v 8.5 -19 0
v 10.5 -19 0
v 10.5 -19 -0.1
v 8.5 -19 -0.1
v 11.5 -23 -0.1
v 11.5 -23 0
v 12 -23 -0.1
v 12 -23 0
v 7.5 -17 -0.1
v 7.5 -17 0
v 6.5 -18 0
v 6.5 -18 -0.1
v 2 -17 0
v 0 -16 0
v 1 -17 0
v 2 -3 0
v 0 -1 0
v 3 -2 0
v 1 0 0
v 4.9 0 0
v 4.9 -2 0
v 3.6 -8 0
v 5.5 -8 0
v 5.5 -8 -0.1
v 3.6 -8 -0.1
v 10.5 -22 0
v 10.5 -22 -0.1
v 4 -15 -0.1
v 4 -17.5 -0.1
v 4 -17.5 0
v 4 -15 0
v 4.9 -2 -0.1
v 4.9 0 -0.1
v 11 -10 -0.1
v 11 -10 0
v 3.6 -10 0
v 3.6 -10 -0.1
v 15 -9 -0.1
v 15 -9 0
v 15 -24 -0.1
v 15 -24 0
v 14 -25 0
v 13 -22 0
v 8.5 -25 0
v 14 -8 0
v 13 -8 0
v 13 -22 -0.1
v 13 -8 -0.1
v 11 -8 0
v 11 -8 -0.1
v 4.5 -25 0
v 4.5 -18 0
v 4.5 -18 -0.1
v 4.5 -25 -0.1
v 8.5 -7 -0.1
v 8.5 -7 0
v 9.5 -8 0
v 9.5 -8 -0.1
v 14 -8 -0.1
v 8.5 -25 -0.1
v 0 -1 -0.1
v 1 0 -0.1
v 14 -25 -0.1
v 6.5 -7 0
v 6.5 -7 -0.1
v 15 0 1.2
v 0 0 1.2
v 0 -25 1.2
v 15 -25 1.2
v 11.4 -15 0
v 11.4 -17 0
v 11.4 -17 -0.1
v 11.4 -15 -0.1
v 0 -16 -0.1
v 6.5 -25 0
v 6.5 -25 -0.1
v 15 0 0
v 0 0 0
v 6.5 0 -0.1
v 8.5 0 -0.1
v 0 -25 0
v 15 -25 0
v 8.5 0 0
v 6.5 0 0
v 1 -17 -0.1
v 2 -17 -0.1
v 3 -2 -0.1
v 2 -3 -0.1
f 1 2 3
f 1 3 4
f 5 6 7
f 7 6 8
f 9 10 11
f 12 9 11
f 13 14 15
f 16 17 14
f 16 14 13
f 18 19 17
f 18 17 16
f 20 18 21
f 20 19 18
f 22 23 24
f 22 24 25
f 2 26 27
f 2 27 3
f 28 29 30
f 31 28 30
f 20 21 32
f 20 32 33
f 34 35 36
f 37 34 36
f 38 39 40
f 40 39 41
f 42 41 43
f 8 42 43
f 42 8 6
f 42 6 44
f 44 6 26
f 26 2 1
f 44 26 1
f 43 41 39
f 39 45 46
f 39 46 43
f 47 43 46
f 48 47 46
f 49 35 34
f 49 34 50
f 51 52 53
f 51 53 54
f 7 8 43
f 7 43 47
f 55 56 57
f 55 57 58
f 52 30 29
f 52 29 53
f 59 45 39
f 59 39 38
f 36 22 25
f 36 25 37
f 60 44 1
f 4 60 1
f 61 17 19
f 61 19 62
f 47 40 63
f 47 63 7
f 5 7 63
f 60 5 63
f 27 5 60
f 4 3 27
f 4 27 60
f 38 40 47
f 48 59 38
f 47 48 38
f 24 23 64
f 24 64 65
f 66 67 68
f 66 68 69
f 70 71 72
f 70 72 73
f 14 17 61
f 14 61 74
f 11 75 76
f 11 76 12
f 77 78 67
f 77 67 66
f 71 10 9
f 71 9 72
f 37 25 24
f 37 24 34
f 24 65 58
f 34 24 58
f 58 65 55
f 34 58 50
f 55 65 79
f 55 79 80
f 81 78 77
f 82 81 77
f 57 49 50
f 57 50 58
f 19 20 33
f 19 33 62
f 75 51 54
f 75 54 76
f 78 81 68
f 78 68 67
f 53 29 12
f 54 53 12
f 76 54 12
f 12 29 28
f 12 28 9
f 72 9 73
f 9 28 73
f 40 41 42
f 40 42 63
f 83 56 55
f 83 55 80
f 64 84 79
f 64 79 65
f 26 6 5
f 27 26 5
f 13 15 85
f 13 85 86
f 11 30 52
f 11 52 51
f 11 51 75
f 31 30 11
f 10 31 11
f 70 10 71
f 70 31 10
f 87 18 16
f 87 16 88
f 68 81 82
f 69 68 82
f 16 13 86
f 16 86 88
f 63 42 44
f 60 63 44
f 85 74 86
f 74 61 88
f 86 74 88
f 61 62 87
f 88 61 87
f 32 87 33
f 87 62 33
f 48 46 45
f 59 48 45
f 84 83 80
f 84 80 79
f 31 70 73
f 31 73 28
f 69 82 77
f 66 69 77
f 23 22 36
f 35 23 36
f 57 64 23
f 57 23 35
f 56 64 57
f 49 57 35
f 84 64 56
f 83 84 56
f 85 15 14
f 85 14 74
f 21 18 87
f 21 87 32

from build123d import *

# Parameters (mm, degrees)
SKETCH1_W             = 15
SKETCH1_H             = 25
BOSS_EXTRUDE1_DEPTH   = 1.2
BOSS_EXTRUDE2_DEPTH   = 0.1
BOSS_EXTRUDE2_2_DEPTH = 0.1
BOSS_EXTRUDE2_3_DEPTH = 0.1
BOSS_EXTRUDE2_4_DEPTH = 0.1
SKETCH3_W             = 2
SKETCH3_H             = 4
BOSS_EXTRUDE3_DEPTH   = 0.1
CHAMFER5_SIZE         = 1
CHAMFER6_SIZE         = 1
CHAMFER7_SIZE         = 1
CHAMFER8_SIZE         = 1


with BuildPart() as part:
    # Sketch1 → Boss-Extrude1 (new body)
    with BuildSketch(Plane.XY):
        with Locations((7.5, -12.5)):
            Rectangle(SKETCH1_W, SKETCH1_H)
    extrude(amount=BOSS_EXTRUDE1_DEPTH)


with BuildPart() as body_2:
    # Sketch2 → Boss-Extrude2 (new body)
    with BuildSketch(Plane(origin=(0, 0, 0), x_dir=(-1, 0, 0), z_dir=(0, 0, -1))):
        Polygon((-6.5, -17), (-11.4, -17), (-11.4, -15), (-4, -15), (-4, -17), (-4.5, -17), (-4.5, -25), (-6.5, -25), align=None)
    extrude(amount=BOSS_EXTRUDE2_DEPTH)

    # Chamfer6
    # the kernel refuses this chamfer: 1 mm, written as the material it adds along each edge
    with BuildSketch(Plane(origin=(6.5, -17, 0), x_dir=(0.9996219169112968, 0.027495876610585623, 0), z_dir=(0, 0, -1))) as chamfer6_piece_1:
        Polygon((CHAMFER6_SIZE * 0.999621916911, CHAMFER6_SIZE * 0.0274958766106), (-CHAMFER6_SIZE * 0.0274958766106, CHAMFER6_SIZE * 0.999621916911), (0, 0), align=None)
    extrude(amount=0.1)
    with BuildSketch(Plane(origin=(4.5, -17, 0), x_dir=(-0.9996219169112968, 0.027495876610585623, 0), z_dir=(0, 0, -1))) as chamfer6_piece_2_section:
        Polygon((CHAMFER6_SIZE * 0.999621916911, -CHAMFER6_SIZE * 0.0274958766106), (-CHAMFER6_SIZE * 0.0274958766106, -CHAMFER6_SIZE * 0.999621916911), (0, 0), align=None)
    chamfer6_piece_2 = extrude(amount=0.1, mode=Mode.PRIVATE)
    chamfer6_piece_2 = split(chamfer6_piece_2, bisect_by=Plane(origin=(4, -17.393401084, -0.05), z_dir=(1, 0, 0)), keep=Keep.TOP, mode=Mode.PRIVATE)
    add(chamfer6_piece_2)


with BuildPart() as body_3:
    # Sketch2 → Boss-Extrude2 2 (new body)
    with BuildSketch(Plane(origin=(0, 0, 0), x_dir=(-1, 0, 0), z_dir=(0, 0, -1))):
        Polygon((-4.9, 0), (0, 0), (0, -17), (-2, -17), (-2, -2), (-4.9, -2), align=None)
    extrude(amount=BOSS_EXTRUDE2_2_DEPTH)

    # Chamfer7
    chamfer7_edges = [body_3.edges().sort_by_distance(p)[0] for p in [
        (0, 0, -0.05),
        (0, -17, -0.05),
        (2, -2, -0.05),
    ]]
    chamfer(chamfer7_edges, length=CHAMFER7_SIZE)


with BuildPart() as body_4:
    # Sketch2 → Boss-Extrude2 3 (new body)
    with BuildSketch(Plane(origin=(0, 0, 0), x_dir=(-1, 0, 0), z_dir=(0, 0, -1))):
        Polygon((-8.5, 0), (-6.5, 0), (-6.5, -8), (-3.6, -8), (-3.6, -10), (-7.5, -10), (-11, -10), (-11, -8), (-8.5, -8), align=None)
    extrude(amount=BOSS_EXTRUDE2_3_DEPTH)

    # Chamfer8
    chamfer8_edges = [body_4.edges().sort_by_distance(p)[0] for p in [
        (8.5, -8, -0.05),
        (6.5, -8, -0.05),
    ]]
    chamfer(chamfer8_edges, length=CHAMFER8_SIZE)


with BuildPart() as body_5:
    # Sketch2 → Boss-Extrude2 4 (new body)
    with BuildSketch(Plane(origin=(0, 0, 0), x_dir=(-1, 0, 0), z_dir=(0, 0, -1))):
        Polygon((-8.5, -25), (-8.5, -23), (-13, -23), (-13, -8), (-15, -8), (-15, -25), align=None)
    extrude(amount=BOSS_EXTRUDE2_4_DEPTH)

    # Sketch3 → Boss-Extrude3 (add)
    with BuildSketch(Plane(origin=(0, 0, 0), x_dir=(-1, 0, 0), z_dir=(0, 0, -1))):
        with Locations((-9.5, -21)):
            Rectangle(SKETCH3_W, SKETCH3_H)
    extrude(amount=BOSS_EXTRUDE3_DEPTH)

    # Chamfer5
    chamfer5_edges = [body_5.edges().sort_by_distance(p)[0] for p in [
        (13, -23, -0.05),
        (15, -25, -0.05),
        (15, -8, -0.05),
        (10.5, -23, -0.05),
    ]]
    chamfer(chamfer5_edges, length=CHAMFER5_SIZE)


solid = Compound([part.part, body_2.part, body_3.part, body_4.part, body_5.part])
